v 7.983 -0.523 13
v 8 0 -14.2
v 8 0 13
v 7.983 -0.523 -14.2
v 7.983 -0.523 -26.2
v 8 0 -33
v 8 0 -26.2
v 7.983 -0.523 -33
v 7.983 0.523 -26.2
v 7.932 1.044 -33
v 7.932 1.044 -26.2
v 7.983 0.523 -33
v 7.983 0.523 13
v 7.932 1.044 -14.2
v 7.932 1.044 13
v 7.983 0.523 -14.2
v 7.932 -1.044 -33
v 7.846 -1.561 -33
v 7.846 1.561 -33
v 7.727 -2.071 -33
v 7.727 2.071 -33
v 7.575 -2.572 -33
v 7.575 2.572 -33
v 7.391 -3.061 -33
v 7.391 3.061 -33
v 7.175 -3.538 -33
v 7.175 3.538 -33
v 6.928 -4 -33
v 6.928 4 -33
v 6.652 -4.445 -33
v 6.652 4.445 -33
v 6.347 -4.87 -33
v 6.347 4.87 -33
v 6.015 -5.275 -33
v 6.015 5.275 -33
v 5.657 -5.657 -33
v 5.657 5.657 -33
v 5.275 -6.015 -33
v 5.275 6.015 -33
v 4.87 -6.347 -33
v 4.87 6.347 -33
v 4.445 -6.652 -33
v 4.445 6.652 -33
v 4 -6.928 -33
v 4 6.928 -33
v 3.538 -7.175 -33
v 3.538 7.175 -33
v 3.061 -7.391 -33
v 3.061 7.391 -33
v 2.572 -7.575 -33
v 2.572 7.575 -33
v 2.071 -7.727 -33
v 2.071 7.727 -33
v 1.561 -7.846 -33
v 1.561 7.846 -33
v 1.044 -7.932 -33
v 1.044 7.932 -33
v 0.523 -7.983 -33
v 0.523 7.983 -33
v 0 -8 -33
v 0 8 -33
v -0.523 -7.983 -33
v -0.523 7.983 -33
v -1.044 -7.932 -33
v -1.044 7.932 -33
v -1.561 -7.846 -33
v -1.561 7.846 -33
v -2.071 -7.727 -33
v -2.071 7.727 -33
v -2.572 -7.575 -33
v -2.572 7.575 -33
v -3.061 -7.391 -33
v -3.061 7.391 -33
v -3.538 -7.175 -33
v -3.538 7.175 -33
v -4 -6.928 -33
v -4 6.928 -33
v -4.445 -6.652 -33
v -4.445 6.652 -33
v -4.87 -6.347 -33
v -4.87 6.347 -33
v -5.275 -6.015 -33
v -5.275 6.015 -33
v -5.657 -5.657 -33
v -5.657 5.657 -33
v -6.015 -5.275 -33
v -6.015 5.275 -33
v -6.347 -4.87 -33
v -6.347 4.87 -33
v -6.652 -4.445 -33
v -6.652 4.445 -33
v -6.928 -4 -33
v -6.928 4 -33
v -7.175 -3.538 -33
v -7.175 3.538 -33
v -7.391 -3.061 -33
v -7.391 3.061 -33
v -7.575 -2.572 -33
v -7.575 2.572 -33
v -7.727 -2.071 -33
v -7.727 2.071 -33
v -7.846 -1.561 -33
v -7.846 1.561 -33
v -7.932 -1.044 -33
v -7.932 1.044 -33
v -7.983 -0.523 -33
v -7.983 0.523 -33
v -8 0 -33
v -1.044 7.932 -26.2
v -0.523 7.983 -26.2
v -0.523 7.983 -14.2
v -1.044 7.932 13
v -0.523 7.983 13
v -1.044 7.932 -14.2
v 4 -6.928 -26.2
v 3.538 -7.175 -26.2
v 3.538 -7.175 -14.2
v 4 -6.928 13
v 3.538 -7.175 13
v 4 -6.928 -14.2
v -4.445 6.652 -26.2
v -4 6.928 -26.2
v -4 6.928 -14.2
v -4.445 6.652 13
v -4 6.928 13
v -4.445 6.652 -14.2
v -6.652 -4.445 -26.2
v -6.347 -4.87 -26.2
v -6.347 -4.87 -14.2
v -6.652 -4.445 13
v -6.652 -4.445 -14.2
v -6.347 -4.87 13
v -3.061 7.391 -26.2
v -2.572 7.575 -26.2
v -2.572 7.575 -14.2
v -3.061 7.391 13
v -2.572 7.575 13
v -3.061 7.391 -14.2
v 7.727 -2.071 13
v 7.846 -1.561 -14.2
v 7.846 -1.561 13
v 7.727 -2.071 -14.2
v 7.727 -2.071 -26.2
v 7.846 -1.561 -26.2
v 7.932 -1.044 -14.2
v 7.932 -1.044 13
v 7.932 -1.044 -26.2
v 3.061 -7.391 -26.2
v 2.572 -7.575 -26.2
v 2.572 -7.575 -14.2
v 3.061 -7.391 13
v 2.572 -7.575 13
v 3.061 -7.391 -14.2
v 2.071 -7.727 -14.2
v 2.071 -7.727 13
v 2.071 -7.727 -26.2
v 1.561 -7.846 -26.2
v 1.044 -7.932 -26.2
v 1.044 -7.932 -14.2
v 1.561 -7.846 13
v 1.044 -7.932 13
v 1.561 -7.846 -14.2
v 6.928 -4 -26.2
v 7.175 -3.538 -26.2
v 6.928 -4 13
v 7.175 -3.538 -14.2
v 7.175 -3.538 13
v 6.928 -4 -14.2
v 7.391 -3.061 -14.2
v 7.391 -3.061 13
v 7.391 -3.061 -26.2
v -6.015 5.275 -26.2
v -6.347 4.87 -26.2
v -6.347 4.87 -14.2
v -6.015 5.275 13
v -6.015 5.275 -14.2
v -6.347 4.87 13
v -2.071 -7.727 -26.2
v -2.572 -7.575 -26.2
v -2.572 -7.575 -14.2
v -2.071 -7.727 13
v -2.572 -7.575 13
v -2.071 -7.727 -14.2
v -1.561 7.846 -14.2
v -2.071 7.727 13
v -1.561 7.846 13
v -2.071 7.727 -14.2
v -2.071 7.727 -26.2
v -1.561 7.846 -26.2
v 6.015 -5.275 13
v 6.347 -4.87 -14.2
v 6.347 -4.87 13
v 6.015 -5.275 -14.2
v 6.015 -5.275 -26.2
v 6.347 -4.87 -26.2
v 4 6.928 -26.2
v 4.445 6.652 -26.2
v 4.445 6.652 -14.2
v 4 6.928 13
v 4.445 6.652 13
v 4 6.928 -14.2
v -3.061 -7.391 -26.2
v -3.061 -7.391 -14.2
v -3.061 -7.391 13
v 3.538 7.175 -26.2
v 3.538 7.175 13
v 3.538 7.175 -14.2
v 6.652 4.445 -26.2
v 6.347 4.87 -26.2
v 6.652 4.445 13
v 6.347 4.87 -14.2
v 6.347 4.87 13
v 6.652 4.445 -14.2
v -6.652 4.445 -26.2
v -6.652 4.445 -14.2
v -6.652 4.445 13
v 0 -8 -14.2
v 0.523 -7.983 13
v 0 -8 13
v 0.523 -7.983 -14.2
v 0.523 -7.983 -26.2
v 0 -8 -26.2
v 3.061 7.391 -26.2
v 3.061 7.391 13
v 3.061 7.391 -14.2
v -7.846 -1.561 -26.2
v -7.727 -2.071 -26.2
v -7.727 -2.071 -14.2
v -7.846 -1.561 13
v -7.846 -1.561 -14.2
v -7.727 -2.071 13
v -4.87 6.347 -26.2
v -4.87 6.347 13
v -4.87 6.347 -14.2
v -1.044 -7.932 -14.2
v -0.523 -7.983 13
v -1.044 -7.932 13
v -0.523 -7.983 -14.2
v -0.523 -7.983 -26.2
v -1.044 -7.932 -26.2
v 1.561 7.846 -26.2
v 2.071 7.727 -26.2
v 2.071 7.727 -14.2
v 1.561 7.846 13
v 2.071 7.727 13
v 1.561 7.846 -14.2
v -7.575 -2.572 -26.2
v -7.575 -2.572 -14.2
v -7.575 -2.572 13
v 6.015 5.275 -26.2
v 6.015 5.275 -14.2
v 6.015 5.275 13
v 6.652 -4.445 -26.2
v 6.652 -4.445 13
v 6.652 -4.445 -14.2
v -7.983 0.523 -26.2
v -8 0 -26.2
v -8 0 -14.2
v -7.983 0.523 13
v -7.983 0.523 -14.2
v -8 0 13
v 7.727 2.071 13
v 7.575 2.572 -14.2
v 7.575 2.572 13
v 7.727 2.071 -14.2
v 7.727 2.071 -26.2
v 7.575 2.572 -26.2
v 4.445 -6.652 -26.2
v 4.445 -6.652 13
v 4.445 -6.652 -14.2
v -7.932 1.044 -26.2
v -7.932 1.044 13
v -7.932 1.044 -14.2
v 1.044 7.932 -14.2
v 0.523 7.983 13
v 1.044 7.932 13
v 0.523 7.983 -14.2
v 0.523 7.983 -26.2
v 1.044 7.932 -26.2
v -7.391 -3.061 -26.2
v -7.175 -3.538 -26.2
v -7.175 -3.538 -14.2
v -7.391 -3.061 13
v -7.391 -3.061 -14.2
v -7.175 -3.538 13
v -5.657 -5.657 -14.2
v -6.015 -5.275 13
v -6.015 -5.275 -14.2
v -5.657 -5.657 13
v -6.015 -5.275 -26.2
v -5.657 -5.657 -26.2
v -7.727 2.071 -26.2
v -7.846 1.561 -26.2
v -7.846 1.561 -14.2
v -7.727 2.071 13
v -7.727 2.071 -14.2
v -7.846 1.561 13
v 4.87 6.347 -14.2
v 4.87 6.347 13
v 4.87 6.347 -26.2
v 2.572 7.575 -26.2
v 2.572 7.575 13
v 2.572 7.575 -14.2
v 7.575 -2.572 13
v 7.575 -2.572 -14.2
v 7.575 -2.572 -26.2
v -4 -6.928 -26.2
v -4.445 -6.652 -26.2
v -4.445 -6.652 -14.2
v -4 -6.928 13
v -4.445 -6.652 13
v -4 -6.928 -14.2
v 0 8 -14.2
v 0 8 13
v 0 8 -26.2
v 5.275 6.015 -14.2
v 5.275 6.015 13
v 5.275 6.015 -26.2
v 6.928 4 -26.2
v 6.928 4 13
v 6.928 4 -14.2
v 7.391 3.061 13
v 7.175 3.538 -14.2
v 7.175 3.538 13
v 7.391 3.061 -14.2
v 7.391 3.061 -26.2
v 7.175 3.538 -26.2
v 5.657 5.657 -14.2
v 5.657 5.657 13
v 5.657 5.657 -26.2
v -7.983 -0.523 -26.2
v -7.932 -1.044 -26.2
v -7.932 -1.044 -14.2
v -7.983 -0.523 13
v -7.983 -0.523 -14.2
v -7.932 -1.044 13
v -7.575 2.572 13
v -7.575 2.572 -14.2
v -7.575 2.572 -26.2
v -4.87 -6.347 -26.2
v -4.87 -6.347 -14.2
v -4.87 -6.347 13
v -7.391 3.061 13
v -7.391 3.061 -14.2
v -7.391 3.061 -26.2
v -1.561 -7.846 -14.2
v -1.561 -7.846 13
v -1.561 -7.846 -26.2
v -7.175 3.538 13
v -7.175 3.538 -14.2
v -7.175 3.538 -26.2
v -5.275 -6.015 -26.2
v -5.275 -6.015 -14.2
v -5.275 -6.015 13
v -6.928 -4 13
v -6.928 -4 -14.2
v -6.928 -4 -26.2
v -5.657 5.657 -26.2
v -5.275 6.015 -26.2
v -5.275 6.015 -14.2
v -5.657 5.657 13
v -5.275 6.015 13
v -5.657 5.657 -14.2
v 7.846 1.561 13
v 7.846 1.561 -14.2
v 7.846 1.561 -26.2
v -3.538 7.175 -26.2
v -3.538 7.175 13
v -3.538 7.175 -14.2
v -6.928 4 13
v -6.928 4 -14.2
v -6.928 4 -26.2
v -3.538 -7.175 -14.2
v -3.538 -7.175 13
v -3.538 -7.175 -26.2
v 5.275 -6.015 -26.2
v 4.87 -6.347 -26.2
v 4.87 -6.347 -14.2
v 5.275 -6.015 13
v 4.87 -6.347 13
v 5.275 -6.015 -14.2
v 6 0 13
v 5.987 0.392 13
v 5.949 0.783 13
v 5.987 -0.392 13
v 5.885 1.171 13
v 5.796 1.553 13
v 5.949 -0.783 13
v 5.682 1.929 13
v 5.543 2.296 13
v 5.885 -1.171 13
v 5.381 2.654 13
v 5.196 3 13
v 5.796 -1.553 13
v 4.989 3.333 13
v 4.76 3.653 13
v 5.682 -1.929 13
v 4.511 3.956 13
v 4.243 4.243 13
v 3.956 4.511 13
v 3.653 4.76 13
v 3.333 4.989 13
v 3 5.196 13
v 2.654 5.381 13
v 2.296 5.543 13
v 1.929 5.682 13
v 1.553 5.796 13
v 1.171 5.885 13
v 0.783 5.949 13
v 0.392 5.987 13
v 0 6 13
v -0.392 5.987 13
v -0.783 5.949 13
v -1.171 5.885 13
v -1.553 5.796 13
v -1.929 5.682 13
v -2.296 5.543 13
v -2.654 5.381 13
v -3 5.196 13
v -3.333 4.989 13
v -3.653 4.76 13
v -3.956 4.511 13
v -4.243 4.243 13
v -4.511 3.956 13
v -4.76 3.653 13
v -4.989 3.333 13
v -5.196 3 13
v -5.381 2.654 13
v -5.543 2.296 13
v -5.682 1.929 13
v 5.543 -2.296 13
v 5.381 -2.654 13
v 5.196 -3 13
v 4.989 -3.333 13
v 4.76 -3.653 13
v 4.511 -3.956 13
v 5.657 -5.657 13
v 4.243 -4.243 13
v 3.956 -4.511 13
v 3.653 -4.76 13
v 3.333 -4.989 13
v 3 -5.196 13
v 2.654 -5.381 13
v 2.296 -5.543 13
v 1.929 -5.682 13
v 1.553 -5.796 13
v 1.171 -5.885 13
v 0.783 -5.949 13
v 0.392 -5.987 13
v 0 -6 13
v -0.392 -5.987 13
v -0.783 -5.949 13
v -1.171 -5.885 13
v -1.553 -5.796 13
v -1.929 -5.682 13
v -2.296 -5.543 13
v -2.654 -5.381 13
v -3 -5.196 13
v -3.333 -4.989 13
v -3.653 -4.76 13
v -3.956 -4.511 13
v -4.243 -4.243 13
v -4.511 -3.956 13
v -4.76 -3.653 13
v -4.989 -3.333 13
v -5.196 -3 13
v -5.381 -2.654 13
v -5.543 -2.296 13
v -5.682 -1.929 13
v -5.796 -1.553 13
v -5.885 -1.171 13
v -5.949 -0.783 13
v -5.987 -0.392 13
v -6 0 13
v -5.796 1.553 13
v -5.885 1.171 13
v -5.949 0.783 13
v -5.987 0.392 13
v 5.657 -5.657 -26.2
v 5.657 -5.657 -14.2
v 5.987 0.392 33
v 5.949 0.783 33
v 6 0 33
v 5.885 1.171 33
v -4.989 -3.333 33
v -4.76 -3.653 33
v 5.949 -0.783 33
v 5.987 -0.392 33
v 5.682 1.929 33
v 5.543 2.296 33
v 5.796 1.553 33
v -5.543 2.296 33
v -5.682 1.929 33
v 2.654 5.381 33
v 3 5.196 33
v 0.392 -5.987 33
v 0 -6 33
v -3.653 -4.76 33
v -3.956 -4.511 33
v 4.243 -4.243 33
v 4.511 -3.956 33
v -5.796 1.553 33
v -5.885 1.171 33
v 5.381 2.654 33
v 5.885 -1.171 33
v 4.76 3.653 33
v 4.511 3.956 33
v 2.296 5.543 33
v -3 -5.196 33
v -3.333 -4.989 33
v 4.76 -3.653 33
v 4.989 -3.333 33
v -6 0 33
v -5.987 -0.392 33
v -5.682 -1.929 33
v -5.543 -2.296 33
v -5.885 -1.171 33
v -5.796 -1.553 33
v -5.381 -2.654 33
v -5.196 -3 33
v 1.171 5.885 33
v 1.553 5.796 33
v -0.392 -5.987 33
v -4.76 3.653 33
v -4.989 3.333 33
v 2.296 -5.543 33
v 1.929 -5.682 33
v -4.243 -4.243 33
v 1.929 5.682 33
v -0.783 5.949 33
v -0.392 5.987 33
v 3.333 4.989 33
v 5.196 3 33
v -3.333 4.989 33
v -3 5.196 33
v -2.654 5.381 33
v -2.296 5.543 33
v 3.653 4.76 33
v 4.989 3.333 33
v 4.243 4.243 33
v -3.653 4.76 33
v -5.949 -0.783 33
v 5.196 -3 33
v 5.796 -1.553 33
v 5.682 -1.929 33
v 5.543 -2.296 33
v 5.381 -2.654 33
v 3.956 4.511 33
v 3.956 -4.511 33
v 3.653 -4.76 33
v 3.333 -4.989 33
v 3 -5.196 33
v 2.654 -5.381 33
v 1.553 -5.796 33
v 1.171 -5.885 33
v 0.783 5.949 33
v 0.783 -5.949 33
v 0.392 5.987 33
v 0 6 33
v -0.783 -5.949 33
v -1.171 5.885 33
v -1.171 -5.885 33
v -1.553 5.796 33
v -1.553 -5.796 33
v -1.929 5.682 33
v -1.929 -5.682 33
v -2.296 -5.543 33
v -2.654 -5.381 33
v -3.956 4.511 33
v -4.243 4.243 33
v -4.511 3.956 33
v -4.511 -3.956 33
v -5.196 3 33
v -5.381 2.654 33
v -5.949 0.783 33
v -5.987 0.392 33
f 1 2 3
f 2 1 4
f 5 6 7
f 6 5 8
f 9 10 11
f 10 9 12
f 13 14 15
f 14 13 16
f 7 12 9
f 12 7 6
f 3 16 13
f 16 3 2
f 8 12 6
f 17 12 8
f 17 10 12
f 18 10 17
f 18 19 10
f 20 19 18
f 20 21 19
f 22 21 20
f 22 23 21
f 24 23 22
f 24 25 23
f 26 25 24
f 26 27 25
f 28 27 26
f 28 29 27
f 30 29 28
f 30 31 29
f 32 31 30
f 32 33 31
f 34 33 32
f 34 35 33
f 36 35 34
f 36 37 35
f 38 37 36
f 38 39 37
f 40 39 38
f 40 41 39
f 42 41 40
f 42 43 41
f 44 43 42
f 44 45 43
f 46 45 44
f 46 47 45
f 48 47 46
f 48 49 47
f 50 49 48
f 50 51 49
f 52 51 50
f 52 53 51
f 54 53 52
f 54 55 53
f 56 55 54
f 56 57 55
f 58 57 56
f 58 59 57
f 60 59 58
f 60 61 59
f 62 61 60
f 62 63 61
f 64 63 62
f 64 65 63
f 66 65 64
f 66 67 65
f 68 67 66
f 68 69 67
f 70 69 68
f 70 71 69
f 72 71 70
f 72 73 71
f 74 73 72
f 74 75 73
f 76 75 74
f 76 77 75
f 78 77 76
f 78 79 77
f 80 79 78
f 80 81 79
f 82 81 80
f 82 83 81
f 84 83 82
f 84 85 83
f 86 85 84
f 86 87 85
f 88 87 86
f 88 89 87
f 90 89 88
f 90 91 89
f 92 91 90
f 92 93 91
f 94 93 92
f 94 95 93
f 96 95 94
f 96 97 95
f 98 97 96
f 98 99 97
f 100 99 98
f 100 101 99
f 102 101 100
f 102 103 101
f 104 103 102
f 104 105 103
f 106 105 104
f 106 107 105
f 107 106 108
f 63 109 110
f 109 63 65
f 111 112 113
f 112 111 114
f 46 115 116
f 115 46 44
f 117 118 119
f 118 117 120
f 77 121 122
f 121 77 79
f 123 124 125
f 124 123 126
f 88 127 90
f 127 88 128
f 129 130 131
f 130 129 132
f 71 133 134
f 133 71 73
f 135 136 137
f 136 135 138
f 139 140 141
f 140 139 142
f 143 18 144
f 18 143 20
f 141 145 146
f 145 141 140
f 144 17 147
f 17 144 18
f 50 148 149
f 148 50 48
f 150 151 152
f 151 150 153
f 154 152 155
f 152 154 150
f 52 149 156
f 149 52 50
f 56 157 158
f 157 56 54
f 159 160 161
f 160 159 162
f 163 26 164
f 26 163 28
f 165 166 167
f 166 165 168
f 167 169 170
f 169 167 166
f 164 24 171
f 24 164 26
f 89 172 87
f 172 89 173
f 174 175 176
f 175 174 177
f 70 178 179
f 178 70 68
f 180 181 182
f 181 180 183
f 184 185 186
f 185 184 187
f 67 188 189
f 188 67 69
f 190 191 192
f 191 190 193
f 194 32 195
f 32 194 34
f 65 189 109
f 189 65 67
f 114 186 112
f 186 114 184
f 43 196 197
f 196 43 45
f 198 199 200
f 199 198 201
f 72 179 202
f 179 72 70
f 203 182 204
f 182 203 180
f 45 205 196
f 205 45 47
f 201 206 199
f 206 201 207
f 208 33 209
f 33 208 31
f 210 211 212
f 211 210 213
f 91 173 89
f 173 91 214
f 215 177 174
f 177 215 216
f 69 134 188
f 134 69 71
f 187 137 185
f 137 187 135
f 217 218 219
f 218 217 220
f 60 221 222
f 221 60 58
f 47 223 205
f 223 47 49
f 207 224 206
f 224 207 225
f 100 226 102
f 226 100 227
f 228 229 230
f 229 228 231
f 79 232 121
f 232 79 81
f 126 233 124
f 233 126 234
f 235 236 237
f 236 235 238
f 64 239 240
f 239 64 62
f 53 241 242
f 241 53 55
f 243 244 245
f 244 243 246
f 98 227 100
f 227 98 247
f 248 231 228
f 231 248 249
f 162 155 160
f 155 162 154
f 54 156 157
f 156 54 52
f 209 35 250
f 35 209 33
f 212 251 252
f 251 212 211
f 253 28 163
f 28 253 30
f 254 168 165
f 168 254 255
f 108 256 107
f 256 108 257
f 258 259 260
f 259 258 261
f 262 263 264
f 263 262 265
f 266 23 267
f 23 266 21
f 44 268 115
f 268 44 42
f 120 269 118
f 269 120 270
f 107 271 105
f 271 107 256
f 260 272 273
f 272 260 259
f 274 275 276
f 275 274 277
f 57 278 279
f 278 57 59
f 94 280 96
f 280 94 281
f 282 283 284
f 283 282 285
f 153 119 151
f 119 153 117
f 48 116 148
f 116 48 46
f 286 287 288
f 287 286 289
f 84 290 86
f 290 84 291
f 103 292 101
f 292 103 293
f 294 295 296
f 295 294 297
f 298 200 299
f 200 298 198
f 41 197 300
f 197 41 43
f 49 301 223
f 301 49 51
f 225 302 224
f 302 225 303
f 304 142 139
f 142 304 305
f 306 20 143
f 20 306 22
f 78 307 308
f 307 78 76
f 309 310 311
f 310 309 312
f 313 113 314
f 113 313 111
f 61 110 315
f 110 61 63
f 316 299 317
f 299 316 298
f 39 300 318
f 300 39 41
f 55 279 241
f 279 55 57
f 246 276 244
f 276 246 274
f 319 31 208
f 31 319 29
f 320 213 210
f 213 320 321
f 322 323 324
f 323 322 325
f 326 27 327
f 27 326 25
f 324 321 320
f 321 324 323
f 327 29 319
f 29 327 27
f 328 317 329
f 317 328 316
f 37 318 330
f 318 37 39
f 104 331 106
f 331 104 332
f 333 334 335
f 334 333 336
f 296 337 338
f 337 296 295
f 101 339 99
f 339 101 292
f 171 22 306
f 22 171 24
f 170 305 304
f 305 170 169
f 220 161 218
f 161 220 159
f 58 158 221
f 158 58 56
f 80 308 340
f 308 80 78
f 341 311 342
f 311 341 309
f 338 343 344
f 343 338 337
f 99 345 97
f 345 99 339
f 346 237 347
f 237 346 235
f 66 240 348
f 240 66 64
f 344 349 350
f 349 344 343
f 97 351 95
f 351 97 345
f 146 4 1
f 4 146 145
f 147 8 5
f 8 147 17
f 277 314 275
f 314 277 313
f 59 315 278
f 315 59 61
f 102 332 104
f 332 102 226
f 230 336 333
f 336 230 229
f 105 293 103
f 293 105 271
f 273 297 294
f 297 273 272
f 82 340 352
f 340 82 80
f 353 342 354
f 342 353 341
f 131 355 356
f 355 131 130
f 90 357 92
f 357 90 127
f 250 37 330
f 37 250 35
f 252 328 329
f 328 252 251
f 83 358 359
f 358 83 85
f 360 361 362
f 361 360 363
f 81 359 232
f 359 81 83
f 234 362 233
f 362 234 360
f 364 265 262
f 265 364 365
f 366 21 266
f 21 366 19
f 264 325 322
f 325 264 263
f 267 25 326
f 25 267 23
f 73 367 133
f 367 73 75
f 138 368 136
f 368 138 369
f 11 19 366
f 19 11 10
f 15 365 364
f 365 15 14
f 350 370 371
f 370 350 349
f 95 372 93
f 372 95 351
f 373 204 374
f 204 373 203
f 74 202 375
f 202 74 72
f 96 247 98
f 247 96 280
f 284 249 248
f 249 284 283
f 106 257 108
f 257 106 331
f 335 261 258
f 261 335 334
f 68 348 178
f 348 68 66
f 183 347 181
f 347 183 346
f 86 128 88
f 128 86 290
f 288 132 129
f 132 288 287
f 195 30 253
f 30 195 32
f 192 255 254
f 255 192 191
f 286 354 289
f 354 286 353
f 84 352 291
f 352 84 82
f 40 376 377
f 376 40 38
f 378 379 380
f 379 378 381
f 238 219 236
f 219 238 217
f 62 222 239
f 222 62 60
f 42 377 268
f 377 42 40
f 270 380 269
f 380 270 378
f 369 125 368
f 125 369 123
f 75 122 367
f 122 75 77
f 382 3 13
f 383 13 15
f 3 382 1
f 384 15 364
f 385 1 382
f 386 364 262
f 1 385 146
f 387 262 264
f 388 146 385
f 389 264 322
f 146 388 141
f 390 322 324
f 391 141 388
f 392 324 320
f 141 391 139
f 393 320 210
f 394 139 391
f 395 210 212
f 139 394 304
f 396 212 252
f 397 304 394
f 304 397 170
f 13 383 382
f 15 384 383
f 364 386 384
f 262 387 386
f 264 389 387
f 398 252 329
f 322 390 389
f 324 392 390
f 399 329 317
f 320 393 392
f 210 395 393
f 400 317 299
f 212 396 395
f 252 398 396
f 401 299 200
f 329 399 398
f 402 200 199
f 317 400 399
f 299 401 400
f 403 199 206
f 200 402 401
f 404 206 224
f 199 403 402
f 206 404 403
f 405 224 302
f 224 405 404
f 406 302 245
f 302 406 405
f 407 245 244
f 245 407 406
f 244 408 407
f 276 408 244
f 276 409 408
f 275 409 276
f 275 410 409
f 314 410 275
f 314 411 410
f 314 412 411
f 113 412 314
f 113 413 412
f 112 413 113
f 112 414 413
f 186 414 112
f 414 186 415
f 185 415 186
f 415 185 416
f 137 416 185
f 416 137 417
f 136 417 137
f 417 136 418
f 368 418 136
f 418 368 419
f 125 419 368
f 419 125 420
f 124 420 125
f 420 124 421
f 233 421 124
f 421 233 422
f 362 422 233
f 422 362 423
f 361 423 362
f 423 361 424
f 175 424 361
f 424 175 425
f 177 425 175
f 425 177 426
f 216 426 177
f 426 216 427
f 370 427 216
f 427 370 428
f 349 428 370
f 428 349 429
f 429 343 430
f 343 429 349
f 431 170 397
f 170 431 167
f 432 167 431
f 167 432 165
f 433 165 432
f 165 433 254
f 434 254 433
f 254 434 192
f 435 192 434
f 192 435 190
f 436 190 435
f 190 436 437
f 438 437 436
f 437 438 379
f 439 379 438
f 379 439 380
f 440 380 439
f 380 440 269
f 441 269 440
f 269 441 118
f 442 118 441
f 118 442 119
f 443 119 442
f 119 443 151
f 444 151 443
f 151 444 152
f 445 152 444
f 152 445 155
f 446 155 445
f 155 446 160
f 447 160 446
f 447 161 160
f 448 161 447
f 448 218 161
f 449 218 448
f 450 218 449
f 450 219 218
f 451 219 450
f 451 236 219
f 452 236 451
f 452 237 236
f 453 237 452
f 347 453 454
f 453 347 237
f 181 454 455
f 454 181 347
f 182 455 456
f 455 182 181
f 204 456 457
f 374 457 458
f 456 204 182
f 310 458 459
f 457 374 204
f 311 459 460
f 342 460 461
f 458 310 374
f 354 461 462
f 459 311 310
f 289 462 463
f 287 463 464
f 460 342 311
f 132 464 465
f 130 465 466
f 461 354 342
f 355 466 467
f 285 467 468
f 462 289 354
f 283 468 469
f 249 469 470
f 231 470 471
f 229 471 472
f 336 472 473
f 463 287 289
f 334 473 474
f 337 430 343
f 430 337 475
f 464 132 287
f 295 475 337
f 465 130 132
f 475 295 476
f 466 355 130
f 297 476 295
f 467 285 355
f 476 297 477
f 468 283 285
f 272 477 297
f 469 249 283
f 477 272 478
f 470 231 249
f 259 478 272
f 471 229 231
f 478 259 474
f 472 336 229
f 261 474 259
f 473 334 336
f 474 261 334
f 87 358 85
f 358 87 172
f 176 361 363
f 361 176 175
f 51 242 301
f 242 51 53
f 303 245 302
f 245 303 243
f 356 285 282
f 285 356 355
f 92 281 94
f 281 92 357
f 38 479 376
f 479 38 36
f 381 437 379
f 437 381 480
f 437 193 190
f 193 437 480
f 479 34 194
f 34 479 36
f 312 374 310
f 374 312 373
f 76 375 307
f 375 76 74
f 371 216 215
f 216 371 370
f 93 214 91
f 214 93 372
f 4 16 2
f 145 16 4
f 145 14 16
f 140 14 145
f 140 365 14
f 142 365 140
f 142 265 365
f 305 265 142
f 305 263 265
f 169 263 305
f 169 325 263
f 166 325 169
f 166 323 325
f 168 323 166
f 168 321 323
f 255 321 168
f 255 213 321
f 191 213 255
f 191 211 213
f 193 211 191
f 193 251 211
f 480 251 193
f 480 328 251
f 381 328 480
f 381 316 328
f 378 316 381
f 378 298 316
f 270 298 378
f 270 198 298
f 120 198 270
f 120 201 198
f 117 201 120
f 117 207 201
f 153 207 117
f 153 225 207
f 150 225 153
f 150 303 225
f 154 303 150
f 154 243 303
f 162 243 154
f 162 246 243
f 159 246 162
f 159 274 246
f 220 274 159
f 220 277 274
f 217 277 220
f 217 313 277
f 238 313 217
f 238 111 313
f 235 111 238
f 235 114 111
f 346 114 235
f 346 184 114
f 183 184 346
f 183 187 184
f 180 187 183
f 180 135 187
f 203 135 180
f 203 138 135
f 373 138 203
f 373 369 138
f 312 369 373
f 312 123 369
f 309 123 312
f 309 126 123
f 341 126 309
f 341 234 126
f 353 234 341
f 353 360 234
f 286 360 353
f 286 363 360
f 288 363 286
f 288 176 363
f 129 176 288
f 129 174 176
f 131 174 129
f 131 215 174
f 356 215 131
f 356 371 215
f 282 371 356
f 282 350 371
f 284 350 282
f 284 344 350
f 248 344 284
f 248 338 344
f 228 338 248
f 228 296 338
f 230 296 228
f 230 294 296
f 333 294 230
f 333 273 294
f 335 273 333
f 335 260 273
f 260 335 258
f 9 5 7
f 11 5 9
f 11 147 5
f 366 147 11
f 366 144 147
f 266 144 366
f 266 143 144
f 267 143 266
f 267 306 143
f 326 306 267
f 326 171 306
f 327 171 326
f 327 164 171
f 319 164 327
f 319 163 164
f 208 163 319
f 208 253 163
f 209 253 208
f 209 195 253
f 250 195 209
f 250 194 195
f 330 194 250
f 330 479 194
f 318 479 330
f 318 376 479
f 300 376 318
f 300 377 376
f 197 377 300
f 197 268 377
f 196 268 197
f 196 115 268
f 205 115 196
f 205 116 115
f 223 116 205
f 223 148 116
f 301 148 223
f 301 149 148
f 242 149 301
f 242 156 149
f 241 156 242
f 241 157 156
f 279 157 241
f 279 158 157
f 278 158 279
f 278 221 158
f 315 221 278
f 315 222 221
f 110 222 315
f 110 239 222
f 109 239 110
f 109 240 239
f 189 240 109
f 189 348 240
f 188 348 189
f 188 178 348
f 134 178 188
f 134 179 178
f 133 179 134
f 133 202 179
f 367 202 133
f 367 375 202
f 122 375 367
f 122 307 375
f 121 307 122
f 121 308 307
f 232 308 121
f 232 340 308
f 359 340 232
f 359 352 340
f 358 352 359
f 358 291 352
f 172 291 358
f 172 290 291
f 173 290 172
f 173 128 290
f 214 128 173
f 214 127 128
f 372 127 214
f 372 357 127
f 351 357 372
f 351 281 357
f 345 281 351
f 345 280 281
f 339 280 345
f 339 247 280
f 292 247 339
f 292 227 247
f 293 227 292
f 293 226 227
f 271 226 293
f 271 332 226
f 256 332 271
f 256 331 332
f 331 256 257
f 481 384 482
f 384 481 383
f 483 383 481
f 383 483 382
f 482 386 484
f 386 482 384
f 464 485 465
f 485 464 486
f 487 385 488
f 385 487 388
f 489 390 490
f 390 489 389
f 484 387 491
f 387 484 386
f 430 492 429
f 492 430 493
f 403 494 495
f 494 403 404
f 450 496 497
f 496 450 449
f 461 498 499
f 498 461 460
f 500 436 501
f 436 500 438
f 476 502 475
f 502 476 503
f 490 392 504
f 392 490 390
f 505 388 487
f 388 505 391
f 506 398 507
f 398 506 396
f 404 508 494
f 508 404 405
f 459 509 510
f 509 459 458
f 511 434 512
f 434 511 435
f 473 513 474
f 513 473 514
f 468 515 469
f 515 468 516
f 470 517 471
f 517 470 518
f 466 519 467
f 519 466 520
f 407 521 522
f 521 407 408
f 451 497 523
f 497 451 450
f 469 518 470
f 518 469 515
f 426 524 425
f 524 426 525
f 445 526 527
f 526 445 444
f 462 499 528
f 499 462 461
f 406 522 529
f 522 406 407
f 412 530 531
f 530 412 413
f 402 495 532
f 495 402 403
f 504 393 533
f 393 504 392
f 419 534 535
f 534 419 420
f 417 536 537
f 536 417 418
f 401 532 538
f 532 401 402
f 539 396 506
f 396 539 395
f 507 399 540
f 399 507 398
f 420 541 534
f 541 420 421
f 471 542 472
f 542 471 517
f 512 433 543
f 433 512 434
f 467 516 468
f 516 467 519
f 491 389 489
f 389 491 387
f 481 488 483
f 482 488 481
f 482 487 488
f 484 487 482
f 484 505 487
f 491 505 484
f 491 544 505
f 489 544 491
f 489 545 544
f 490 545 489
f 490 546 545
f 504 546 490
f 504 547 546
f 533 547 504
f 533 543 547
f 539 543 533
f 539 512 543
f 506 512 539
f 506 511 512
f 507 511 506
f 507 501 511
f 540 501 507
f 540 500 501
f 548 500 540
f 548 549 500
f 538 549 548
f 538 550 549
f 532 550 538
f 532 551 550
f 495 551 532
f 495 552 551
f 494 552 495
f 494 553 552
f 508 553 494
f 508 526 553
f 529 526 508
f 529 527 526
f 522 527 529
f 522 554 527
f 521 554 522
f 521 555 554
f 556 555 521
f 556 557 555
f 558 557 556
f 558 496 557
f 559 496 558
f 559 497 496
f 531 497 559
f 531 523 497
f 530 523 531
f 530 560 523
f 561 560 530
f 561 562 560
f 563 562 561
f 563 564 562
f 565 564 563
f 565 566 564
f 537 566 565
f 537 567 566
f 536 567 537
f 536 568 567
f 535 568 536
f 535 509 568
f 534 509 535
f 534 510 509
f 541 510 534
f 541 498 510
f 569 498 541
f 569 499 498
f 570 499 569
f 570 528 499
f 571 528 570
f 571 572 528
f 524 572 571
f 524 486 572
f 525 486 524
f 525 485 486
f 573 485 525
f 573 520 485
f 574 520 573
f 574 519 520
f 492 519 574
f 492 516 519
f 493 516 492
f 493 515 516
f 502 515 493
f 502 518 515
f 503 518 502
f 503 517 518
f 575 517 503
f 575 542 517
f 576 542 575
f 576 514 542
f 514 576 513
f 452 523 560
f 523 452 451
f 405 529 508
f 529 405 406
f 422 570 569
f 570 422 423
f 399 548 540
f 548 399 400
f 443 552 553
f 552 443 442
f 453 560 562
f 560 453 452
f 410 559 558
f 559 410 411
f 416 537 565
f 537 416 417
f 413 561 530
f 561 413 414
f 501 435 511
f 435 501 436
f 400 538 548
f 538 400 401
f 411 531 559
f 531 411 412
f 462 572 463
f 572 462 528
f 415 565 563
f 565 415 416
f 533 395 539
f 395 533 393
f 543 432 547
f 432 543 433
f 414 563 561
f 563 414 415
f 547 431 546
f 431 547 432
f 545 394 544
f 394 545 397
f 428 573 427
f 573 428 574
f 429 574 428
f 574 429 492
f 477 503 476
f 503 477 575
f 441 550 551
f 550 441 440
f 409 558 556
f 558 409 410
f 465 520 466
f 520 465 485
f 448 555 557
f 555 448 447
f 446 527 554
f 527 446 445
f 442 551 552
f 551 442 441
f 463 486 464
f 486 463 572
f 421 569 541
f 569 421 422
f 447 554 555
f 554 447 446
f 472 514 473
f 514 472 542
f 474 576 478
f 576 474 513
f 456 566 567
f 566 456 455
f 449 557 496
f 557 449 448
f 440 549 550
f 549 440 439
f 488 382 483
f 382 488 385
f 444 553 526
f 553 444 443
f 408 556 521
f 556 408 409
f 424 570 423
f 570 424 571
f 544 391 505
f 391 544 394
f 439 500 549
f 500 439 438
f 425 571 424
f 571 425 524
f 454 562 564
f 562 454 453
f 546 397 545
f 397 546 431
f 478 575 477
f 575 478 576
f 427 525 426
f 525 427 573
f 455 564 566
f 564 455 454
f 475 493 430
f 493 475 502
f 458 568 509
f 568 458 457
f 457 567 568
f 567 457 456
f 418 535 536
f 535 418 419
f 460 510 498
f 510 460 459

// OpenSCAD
$fn = 96;

overall_len = 66;
mount_inset = 6.8;

insulator_d = 16;
insulator_r = insulator_d/2;
insulator_len = 46;

groove_width = 12;     // axial length of groove
groove_depth = 5.6;    // radial reduction amount
groove_r = max(0.5, insulator_r - groove_depth);

module hotend_assembly() {
    union() {
        // Main insulator body
        difference() {
            translate([0,0,-overall_len/2])
                cylinder(h=insulator_len, r=insulator_r);

            // Mounting groove (ring cut)
            translate([0,0,-overall_len/2 + mount_inset])
                cylinder(h=groove_width, r=insulator_r + 0.2);
            translate([0,0,-overall_len/2 + mount_inset])
                cylinder(h=groove_width, r=groove_r);
        }

        // Upper neck (to reach overall length)
        neck_len = overall_len - insulator_len;
        if (neck_len > 0) {
            translate([0,0,-overall_len/2 + insulator_len])
                cylinder(h=neck_len, r=6);
        }
    }
}

hotend_assembly();
